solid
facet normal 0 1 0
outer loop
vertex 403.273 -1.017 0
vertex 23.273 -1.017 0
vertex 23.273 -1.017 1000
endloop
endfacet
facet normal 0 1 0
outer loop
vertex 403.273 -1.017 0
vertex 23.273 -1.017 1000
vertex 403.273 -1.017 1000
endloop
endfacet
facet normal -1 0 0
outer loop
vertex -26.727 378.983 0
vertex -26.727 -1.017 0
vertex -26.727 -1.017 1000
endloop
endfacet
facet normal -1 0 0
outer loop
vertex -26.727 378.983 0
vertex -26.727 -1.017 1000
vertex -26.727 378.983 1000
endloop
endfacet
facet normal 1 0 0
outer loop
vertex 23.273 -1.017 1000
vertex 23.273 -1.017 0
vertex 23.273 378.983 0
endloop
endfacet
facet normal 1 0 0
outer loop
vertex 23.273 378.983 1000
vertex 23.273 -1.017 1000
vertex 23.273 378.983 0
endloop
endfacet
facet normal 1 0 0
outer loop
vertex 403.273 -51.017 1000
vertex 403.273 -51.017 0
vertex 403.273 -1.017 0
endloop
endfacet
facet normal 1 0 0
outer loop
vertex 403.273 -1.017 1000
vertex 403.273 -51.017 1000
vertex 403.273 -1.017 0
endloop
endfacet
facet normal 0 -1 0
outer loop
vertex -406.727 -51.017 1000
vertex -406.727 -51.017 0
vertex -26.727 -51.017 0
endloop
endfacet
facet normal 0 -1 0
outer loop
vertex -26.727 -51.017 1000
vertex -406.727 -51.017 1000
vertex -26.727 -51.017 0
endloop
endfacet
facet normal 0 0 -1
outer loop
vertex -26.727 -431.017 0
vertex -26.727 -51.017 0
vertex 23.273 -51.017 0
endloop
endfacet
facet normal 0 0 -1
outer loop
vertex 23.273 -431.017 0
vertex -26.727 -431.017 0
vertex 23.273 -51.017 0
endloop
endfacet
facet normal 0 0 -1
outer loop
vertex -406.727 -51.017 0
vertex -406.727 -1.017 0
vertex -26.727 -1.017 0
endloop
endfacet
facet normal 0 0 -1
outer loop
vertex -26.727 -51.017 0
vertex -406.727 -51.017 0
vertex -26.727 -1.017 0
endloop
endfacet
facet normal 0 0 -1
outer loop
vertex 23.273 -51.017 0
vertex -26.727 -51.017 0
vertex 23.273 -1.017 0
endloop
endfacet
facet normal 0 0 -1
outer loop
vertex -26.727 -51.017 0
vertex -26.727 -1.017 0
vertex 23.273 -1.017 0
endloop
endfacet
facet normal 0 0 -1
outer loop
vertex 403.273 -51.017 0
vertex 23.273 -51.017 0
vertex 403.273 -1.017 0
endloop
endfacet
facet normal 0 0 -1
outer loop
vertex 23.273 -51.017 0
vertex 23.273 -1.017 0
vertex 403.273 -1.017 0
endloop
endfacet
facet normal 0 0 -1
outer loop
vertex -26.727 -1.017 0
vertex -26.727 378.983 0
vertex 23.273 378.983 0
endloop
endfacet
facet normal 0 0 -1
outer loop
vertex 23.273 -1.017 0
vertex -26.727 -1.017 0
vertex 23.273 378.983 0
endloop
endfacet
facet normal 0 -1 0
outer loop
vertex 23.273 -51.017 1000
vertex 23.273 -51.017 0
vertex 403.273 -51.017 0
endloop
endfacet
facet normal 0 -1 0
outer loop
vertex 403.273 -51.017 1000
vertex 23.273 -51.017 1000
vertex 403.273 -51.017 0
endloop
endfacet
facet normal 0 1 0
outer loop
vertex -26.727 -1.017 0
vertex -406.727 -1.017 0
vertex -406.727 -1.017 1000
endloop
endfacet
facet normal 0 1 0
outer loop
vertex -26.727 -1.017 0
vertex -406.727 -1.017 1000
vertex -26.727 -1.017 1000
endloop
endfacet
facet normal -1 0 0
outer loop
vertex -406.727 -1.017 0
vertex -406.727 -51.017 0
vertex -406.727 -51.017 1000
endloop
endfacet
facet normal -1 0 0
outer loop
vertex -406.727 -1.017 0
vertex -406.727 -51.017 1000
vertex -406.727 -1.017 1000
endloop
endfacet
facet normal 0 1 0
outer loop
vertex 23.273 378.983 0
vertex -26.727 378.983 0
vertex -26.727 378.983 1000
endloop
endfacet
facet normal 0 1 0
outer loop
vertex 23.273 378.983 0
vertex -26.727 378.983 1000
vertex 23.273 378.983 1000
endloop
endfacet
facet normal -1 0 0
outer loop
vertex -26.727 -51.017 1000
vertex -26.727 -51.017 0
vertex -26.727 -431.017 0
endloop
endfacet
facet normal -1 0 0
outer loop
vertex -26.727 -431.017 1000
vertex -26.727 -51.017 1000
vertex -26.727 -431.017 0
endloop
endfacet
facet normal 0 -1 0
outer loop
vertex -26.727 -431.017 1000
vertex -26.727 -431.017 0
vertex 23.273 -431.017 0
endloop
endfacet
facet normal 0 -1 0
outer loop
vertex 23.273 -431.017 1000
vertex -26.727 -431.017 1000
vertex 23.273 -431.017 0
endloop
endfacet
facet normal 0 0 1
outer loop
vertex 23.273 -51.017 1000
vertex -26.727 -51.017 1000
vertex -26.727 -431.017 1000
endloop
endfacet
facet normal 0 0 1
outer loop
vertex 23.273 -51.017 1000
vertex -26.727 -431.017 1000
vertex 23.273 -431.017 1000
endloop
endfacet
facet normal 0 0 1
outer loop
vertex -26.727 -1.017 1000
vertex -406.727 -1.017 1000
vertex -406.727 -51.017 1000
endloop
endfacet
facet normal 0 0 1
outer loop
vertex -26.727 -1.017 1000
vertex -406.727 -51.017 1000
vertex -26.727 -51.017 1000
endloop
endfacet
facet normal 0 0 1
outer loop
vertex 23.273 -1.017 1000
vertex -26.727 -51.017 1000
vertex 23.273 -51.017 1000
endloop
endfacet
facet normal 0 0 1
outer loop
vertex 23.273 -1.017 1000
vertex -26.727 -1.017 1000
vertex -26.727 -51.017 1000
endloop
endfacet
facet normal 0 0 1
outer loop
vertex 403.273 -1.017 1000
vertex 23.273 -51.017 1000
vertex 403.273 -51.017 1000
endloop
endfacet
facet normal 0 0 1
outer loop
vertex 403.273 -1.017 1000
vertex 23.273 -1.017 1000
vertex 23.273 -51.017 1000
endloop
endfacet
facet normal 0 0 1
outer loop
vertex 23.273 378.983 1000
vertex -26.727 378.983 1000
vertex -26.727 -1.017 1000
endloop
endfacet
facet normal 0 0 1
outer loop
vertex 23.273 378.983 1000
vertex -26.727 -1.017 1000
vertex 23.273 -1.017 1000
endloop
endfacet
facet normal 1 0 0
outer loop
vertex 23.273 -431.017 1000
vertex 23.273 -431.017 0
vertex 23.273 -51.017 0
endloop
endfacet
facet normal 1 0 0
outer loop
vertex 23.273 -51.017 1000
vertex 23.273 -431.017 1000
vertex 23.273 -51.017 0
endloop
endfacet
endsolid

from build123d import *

# Parameters (mm, degrees)
F0_W     = 380
F0_H     = 50
F0_W_2   = 50
F0_H_2   = 380
F1_DEPTH = 1000


with BuildPart() as f1:
    # F0 (on Top) → F1 (new body)
    with BuildSketch(Plane.XY):
        with Locations((-216.727231, -26.01678)):
            Rectangle(F0_W, F0_H)
        with Locations((213.272769, -26.01678)):
            Rectangle(F0_W, F0_H)
        with Locations((-1.727231, 188.98322)):
            Rectangle(F0_W_2, F0_H_2)
        Polygon((0, -51.01678), (-26.727231, -51.01678), (-26.727231, -431.01678), (23.272769, -431.01678), (23.272769, -51.01678), align=None)
        Polygon((23.272769, -1.01678), (-26.727231, -1.01678), (-26.727231, -51.01678), (0, -51.01678), (23.272769, -51.01678), align=None)
    extrude(amount=F1_DEPTH)


solid = f1.part
